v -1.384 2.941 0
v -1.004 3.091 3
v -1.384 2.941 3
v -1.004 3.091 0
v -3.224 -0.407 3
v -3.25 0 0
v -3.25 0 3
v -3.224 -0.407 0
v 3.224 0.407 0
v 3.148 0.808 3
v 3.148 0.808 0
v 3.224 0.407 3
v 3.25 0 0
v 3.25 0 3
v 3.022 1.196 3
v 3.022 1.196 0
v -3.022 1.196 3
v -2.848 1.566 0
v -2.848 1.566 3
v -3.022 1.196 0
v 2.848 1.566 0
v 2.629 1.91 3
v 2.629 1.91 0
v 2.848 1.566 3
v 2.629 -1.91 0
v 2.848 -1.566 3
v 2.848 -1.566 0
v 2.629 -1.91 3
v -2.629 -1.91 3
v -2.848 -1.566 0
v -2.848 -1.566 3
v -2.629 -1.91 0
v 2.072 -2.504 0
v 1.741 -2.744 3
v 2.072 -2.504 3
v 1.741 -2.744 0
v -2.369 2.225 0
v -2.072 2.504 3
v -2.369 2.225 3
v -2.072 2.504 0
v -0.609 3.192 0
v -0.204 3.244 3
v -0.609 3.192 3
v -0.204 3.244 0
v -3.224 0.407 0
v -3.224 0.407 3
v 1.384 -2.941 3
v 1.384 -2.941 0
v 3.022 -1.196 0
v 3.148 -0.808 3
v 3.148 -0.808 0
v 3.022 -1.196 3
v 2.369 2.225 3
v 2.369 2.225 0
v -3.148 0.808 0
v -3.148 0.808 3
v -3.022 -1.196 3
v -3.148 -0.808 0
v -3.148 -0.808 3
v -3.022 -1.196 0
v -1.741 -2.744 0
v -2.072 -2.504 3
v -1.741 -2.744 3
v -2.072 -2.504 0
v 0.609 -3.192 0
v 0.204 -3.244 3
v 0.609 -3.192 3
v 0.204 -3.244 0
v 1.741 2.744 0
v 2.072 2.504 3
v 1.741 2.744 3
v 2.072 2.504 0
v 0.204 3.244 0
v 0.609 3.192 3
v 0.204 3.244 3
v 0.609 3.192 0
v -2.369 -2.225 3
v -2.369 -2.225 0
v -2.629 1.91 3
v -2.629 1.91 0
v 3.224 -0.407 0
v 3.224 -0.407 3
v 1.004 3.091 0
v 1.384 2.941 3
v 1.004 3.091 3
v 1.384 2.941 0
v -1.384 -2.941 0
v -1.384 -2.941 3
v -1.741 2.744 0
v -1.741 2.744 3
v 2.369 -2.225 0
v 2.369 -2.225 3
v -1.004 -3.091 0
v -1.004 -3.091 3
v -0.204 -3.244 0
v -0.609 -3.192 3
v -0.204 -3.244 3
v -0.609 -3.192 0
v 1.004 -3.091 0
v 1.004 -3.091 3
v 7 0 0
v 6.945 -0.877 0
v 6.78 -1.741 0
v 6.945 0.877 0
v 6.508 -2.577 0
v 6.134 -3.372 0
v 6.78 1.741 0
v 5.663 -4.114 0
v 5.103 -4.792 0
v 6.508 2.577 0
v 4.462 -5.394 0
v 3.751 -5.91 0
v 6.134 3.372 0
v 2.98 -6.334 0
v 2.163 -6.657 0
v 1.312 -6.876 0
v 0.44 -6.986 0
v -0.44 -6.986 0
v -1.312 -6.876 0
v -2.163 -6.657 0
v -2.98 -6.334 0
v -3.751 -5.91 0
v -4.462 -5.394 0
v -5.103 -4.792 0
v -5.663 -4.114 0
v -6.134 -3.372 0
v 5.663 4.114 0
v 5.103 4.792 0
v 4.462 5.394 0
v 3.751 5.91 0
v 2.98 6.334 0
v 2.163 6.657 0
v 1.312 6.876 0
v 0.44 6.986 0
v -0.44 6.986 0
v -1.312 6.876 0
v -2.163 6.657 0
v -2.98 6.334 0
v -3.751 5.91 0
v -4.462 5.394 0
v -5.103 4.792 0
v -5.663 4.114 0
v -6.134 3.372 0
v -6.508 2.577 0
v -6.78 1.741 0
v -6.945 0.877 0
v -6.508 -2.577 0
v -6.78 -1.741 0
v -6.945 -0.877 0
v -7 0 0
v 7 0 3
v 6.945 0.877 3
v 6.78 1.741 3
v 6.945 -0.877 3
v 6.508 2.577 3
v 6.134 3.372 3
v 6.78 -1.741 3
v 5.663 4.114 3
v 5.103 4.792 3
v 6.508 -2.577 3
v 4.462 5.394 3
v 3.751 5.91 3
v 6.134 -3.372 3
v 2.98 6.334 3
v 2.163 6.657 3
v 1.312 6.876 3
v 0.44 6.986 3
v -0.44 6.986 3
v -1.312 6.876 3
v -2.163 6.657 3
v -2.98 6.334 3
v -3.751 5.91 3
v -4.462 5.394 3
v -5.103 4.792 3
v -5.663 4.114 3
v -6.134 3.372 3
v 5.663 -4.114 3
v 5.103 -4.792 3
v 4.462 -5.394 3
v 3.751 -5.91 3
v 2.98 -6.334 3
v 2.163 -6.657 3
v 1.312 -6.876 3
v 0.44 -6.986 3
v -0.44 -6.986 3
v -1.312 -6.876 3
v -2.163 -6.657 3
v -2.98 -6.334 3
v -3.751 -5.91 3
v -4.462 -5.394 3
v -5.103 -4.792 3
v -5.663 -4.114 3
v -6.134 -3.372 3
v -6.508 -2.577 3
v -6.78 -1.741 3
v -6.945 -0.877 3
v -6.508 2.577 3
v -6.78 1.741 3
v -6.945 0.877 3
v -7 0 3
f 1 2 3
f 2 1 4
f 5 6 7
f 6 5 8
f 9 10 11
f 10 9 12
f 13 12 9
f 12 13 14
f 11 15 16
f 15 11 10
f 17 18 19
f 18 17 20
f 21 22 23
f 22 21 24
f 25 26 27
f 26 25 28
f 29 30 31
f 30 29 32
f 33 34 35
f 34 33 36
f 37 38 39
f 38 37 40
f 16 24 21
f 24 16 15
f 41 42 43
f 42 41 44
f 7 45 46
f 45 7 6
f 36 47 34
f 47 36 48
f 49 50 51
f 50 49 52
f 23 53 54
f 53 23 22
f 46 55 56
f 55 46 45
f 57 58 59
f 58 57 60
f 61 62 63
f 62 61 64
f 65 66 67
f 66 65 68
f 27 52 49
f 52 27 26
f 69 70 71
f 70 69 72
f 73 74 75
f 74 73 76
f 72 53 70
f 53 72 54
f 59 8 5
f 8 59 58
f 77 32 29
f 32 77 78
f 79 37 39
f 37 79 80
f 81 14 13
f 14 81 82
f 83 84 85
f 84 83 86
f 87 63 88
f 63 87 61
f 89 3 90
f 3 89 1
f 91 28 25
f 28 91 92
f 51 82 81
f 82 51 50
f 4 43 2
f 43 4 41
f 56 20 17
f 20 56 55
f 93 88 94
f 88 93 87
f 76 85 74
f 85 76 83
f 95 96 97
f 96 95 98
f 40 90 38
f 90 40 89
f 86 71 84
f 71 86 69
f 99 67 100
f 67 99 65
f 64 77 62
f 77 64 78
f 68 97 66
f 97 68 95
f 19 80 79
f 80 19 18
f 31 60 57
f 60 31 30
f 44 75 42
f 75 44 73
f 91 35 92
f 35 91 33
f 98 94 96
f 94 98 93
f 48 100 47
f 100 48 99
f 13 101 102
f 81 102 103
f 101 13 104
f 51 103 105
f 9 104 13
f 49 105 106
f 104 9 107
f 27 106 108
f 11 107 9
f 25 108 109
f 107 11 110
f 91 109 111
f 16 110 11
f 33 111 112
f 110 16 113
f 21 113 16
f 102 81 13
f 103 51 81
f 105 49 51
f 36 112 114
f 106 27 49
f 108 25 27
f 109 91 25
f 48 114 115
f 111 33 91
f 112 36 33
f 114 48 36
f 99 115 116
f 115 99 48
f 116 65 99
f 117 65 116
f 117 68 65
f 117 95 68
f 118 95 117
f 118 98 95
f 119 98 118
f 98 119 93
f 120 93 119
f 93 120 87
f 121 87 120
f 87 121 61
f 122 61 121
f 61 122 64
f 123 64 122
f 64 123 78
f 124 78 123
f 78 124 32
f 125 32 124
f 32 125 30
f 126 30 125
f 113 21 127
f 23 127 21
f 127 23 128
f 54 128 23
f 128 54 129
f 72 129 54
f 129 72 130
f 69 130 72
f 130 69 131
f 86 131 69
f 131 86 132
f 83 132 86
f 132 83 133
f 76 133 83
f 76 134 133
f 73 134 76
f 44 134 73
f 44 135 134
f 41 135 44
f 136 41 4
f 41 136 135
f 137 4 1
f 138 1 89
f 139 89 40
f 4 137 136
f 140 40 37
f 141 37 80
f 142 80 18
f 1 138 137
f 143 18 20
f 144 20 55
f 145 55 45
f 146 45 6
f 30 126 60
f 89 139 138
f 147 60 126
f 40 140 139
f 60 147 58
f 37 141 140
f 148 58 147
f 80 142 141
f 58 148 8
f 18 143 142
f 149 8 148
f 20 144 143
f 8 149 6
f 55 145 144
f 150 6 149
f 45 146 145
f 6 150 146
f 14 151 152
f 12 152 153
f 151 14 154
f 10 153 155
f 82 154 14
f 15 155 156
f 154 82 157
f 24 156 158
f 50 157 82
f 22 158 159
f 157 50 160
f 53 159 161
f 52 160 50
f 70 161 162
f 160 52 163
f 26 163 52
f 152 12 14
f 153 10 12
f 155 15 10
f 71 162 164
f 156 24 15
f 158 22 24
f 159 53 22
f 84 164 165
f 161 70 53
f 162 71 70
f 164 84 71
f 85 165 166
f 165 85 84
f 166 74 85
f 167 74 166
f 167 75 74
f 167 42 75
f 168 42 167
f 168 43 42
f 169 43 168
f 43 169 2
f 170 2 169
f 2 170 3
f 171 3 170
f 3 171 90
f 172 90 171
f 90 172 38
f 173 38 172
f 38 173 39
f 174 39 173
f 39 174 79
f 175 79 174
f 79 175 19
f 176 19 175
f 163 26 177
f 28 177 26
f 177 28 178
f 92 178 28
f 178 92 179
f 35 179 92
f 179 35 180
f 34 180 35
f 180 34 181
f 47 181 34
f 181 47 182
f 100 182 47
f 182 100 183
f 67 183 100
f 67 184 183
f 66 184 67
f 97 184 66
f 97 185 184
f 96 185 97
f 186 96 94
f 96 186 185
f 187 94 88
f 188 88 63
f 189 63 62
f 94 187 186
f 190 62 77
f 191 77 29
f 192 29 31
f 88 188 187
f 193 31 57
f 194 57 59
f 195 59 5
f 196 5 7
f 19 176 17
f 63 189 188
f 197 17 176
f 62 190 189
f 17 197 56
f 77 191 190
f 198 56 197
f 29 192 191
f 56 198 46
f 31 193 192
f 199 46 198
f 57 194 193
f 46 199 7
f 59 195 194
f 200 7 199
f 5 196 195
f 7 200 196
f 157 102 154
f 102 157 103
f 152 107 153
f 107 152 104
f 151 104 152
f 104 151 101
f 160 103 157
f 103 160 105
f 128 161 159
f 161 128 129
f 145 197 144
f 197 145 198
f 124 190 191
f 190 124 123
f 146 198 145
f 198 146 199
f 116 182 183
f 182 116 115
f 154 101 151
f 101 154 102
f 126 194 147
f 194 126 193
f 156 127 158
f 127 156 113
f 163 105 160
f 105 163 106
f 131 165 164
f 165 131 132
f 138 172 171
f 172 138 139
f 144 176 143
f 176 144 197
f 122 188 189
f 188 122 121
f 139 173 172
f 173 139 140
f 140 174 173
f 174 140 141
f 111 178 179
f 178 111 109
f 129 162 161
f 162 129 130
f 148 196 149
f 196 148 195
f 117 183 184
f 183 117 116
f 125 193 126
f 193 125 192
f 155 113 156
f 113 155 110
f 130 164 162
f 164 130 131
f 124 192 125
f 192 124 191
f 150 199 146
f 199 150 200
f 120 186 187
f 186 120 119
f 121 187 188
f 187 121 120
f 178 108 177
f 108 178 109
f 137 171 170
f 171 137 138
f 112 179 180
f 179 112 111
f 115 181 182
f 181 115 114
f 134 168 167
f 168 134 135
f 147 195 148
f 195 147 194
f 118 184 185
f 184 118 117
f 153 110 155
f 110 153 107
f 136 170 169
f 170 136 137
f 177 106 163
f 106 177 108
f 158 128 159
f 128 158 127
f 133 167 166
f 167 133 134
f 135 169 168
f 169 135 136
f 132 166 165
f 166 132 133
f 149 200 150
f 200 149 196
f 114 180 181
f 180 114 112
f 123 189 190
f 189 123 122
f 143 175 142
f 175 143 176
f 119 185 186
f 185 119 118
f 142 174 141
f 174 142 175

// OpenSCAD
$fn = 50;


difference() {
	union() {
		cylinder(h = 3, r = 7.0000000000);
	}
	union() {
		cylinder(h = 3, r = 3.2500000000);
		cylinder(h = 3, r = 3.2500000000);
		cylinder(h = 3, r = 1.8000000000);
		cylinder(h = 3, r = 1.8000000000);
		cylinder(h = 3, r = 1.8000000000);
		cylinder(h = 3, r = 1.8000000000);
		cylinder(h = 3, r = 1.8000000000);
		cylinder(h = 3, r = 1.8000000000);
	}
}
